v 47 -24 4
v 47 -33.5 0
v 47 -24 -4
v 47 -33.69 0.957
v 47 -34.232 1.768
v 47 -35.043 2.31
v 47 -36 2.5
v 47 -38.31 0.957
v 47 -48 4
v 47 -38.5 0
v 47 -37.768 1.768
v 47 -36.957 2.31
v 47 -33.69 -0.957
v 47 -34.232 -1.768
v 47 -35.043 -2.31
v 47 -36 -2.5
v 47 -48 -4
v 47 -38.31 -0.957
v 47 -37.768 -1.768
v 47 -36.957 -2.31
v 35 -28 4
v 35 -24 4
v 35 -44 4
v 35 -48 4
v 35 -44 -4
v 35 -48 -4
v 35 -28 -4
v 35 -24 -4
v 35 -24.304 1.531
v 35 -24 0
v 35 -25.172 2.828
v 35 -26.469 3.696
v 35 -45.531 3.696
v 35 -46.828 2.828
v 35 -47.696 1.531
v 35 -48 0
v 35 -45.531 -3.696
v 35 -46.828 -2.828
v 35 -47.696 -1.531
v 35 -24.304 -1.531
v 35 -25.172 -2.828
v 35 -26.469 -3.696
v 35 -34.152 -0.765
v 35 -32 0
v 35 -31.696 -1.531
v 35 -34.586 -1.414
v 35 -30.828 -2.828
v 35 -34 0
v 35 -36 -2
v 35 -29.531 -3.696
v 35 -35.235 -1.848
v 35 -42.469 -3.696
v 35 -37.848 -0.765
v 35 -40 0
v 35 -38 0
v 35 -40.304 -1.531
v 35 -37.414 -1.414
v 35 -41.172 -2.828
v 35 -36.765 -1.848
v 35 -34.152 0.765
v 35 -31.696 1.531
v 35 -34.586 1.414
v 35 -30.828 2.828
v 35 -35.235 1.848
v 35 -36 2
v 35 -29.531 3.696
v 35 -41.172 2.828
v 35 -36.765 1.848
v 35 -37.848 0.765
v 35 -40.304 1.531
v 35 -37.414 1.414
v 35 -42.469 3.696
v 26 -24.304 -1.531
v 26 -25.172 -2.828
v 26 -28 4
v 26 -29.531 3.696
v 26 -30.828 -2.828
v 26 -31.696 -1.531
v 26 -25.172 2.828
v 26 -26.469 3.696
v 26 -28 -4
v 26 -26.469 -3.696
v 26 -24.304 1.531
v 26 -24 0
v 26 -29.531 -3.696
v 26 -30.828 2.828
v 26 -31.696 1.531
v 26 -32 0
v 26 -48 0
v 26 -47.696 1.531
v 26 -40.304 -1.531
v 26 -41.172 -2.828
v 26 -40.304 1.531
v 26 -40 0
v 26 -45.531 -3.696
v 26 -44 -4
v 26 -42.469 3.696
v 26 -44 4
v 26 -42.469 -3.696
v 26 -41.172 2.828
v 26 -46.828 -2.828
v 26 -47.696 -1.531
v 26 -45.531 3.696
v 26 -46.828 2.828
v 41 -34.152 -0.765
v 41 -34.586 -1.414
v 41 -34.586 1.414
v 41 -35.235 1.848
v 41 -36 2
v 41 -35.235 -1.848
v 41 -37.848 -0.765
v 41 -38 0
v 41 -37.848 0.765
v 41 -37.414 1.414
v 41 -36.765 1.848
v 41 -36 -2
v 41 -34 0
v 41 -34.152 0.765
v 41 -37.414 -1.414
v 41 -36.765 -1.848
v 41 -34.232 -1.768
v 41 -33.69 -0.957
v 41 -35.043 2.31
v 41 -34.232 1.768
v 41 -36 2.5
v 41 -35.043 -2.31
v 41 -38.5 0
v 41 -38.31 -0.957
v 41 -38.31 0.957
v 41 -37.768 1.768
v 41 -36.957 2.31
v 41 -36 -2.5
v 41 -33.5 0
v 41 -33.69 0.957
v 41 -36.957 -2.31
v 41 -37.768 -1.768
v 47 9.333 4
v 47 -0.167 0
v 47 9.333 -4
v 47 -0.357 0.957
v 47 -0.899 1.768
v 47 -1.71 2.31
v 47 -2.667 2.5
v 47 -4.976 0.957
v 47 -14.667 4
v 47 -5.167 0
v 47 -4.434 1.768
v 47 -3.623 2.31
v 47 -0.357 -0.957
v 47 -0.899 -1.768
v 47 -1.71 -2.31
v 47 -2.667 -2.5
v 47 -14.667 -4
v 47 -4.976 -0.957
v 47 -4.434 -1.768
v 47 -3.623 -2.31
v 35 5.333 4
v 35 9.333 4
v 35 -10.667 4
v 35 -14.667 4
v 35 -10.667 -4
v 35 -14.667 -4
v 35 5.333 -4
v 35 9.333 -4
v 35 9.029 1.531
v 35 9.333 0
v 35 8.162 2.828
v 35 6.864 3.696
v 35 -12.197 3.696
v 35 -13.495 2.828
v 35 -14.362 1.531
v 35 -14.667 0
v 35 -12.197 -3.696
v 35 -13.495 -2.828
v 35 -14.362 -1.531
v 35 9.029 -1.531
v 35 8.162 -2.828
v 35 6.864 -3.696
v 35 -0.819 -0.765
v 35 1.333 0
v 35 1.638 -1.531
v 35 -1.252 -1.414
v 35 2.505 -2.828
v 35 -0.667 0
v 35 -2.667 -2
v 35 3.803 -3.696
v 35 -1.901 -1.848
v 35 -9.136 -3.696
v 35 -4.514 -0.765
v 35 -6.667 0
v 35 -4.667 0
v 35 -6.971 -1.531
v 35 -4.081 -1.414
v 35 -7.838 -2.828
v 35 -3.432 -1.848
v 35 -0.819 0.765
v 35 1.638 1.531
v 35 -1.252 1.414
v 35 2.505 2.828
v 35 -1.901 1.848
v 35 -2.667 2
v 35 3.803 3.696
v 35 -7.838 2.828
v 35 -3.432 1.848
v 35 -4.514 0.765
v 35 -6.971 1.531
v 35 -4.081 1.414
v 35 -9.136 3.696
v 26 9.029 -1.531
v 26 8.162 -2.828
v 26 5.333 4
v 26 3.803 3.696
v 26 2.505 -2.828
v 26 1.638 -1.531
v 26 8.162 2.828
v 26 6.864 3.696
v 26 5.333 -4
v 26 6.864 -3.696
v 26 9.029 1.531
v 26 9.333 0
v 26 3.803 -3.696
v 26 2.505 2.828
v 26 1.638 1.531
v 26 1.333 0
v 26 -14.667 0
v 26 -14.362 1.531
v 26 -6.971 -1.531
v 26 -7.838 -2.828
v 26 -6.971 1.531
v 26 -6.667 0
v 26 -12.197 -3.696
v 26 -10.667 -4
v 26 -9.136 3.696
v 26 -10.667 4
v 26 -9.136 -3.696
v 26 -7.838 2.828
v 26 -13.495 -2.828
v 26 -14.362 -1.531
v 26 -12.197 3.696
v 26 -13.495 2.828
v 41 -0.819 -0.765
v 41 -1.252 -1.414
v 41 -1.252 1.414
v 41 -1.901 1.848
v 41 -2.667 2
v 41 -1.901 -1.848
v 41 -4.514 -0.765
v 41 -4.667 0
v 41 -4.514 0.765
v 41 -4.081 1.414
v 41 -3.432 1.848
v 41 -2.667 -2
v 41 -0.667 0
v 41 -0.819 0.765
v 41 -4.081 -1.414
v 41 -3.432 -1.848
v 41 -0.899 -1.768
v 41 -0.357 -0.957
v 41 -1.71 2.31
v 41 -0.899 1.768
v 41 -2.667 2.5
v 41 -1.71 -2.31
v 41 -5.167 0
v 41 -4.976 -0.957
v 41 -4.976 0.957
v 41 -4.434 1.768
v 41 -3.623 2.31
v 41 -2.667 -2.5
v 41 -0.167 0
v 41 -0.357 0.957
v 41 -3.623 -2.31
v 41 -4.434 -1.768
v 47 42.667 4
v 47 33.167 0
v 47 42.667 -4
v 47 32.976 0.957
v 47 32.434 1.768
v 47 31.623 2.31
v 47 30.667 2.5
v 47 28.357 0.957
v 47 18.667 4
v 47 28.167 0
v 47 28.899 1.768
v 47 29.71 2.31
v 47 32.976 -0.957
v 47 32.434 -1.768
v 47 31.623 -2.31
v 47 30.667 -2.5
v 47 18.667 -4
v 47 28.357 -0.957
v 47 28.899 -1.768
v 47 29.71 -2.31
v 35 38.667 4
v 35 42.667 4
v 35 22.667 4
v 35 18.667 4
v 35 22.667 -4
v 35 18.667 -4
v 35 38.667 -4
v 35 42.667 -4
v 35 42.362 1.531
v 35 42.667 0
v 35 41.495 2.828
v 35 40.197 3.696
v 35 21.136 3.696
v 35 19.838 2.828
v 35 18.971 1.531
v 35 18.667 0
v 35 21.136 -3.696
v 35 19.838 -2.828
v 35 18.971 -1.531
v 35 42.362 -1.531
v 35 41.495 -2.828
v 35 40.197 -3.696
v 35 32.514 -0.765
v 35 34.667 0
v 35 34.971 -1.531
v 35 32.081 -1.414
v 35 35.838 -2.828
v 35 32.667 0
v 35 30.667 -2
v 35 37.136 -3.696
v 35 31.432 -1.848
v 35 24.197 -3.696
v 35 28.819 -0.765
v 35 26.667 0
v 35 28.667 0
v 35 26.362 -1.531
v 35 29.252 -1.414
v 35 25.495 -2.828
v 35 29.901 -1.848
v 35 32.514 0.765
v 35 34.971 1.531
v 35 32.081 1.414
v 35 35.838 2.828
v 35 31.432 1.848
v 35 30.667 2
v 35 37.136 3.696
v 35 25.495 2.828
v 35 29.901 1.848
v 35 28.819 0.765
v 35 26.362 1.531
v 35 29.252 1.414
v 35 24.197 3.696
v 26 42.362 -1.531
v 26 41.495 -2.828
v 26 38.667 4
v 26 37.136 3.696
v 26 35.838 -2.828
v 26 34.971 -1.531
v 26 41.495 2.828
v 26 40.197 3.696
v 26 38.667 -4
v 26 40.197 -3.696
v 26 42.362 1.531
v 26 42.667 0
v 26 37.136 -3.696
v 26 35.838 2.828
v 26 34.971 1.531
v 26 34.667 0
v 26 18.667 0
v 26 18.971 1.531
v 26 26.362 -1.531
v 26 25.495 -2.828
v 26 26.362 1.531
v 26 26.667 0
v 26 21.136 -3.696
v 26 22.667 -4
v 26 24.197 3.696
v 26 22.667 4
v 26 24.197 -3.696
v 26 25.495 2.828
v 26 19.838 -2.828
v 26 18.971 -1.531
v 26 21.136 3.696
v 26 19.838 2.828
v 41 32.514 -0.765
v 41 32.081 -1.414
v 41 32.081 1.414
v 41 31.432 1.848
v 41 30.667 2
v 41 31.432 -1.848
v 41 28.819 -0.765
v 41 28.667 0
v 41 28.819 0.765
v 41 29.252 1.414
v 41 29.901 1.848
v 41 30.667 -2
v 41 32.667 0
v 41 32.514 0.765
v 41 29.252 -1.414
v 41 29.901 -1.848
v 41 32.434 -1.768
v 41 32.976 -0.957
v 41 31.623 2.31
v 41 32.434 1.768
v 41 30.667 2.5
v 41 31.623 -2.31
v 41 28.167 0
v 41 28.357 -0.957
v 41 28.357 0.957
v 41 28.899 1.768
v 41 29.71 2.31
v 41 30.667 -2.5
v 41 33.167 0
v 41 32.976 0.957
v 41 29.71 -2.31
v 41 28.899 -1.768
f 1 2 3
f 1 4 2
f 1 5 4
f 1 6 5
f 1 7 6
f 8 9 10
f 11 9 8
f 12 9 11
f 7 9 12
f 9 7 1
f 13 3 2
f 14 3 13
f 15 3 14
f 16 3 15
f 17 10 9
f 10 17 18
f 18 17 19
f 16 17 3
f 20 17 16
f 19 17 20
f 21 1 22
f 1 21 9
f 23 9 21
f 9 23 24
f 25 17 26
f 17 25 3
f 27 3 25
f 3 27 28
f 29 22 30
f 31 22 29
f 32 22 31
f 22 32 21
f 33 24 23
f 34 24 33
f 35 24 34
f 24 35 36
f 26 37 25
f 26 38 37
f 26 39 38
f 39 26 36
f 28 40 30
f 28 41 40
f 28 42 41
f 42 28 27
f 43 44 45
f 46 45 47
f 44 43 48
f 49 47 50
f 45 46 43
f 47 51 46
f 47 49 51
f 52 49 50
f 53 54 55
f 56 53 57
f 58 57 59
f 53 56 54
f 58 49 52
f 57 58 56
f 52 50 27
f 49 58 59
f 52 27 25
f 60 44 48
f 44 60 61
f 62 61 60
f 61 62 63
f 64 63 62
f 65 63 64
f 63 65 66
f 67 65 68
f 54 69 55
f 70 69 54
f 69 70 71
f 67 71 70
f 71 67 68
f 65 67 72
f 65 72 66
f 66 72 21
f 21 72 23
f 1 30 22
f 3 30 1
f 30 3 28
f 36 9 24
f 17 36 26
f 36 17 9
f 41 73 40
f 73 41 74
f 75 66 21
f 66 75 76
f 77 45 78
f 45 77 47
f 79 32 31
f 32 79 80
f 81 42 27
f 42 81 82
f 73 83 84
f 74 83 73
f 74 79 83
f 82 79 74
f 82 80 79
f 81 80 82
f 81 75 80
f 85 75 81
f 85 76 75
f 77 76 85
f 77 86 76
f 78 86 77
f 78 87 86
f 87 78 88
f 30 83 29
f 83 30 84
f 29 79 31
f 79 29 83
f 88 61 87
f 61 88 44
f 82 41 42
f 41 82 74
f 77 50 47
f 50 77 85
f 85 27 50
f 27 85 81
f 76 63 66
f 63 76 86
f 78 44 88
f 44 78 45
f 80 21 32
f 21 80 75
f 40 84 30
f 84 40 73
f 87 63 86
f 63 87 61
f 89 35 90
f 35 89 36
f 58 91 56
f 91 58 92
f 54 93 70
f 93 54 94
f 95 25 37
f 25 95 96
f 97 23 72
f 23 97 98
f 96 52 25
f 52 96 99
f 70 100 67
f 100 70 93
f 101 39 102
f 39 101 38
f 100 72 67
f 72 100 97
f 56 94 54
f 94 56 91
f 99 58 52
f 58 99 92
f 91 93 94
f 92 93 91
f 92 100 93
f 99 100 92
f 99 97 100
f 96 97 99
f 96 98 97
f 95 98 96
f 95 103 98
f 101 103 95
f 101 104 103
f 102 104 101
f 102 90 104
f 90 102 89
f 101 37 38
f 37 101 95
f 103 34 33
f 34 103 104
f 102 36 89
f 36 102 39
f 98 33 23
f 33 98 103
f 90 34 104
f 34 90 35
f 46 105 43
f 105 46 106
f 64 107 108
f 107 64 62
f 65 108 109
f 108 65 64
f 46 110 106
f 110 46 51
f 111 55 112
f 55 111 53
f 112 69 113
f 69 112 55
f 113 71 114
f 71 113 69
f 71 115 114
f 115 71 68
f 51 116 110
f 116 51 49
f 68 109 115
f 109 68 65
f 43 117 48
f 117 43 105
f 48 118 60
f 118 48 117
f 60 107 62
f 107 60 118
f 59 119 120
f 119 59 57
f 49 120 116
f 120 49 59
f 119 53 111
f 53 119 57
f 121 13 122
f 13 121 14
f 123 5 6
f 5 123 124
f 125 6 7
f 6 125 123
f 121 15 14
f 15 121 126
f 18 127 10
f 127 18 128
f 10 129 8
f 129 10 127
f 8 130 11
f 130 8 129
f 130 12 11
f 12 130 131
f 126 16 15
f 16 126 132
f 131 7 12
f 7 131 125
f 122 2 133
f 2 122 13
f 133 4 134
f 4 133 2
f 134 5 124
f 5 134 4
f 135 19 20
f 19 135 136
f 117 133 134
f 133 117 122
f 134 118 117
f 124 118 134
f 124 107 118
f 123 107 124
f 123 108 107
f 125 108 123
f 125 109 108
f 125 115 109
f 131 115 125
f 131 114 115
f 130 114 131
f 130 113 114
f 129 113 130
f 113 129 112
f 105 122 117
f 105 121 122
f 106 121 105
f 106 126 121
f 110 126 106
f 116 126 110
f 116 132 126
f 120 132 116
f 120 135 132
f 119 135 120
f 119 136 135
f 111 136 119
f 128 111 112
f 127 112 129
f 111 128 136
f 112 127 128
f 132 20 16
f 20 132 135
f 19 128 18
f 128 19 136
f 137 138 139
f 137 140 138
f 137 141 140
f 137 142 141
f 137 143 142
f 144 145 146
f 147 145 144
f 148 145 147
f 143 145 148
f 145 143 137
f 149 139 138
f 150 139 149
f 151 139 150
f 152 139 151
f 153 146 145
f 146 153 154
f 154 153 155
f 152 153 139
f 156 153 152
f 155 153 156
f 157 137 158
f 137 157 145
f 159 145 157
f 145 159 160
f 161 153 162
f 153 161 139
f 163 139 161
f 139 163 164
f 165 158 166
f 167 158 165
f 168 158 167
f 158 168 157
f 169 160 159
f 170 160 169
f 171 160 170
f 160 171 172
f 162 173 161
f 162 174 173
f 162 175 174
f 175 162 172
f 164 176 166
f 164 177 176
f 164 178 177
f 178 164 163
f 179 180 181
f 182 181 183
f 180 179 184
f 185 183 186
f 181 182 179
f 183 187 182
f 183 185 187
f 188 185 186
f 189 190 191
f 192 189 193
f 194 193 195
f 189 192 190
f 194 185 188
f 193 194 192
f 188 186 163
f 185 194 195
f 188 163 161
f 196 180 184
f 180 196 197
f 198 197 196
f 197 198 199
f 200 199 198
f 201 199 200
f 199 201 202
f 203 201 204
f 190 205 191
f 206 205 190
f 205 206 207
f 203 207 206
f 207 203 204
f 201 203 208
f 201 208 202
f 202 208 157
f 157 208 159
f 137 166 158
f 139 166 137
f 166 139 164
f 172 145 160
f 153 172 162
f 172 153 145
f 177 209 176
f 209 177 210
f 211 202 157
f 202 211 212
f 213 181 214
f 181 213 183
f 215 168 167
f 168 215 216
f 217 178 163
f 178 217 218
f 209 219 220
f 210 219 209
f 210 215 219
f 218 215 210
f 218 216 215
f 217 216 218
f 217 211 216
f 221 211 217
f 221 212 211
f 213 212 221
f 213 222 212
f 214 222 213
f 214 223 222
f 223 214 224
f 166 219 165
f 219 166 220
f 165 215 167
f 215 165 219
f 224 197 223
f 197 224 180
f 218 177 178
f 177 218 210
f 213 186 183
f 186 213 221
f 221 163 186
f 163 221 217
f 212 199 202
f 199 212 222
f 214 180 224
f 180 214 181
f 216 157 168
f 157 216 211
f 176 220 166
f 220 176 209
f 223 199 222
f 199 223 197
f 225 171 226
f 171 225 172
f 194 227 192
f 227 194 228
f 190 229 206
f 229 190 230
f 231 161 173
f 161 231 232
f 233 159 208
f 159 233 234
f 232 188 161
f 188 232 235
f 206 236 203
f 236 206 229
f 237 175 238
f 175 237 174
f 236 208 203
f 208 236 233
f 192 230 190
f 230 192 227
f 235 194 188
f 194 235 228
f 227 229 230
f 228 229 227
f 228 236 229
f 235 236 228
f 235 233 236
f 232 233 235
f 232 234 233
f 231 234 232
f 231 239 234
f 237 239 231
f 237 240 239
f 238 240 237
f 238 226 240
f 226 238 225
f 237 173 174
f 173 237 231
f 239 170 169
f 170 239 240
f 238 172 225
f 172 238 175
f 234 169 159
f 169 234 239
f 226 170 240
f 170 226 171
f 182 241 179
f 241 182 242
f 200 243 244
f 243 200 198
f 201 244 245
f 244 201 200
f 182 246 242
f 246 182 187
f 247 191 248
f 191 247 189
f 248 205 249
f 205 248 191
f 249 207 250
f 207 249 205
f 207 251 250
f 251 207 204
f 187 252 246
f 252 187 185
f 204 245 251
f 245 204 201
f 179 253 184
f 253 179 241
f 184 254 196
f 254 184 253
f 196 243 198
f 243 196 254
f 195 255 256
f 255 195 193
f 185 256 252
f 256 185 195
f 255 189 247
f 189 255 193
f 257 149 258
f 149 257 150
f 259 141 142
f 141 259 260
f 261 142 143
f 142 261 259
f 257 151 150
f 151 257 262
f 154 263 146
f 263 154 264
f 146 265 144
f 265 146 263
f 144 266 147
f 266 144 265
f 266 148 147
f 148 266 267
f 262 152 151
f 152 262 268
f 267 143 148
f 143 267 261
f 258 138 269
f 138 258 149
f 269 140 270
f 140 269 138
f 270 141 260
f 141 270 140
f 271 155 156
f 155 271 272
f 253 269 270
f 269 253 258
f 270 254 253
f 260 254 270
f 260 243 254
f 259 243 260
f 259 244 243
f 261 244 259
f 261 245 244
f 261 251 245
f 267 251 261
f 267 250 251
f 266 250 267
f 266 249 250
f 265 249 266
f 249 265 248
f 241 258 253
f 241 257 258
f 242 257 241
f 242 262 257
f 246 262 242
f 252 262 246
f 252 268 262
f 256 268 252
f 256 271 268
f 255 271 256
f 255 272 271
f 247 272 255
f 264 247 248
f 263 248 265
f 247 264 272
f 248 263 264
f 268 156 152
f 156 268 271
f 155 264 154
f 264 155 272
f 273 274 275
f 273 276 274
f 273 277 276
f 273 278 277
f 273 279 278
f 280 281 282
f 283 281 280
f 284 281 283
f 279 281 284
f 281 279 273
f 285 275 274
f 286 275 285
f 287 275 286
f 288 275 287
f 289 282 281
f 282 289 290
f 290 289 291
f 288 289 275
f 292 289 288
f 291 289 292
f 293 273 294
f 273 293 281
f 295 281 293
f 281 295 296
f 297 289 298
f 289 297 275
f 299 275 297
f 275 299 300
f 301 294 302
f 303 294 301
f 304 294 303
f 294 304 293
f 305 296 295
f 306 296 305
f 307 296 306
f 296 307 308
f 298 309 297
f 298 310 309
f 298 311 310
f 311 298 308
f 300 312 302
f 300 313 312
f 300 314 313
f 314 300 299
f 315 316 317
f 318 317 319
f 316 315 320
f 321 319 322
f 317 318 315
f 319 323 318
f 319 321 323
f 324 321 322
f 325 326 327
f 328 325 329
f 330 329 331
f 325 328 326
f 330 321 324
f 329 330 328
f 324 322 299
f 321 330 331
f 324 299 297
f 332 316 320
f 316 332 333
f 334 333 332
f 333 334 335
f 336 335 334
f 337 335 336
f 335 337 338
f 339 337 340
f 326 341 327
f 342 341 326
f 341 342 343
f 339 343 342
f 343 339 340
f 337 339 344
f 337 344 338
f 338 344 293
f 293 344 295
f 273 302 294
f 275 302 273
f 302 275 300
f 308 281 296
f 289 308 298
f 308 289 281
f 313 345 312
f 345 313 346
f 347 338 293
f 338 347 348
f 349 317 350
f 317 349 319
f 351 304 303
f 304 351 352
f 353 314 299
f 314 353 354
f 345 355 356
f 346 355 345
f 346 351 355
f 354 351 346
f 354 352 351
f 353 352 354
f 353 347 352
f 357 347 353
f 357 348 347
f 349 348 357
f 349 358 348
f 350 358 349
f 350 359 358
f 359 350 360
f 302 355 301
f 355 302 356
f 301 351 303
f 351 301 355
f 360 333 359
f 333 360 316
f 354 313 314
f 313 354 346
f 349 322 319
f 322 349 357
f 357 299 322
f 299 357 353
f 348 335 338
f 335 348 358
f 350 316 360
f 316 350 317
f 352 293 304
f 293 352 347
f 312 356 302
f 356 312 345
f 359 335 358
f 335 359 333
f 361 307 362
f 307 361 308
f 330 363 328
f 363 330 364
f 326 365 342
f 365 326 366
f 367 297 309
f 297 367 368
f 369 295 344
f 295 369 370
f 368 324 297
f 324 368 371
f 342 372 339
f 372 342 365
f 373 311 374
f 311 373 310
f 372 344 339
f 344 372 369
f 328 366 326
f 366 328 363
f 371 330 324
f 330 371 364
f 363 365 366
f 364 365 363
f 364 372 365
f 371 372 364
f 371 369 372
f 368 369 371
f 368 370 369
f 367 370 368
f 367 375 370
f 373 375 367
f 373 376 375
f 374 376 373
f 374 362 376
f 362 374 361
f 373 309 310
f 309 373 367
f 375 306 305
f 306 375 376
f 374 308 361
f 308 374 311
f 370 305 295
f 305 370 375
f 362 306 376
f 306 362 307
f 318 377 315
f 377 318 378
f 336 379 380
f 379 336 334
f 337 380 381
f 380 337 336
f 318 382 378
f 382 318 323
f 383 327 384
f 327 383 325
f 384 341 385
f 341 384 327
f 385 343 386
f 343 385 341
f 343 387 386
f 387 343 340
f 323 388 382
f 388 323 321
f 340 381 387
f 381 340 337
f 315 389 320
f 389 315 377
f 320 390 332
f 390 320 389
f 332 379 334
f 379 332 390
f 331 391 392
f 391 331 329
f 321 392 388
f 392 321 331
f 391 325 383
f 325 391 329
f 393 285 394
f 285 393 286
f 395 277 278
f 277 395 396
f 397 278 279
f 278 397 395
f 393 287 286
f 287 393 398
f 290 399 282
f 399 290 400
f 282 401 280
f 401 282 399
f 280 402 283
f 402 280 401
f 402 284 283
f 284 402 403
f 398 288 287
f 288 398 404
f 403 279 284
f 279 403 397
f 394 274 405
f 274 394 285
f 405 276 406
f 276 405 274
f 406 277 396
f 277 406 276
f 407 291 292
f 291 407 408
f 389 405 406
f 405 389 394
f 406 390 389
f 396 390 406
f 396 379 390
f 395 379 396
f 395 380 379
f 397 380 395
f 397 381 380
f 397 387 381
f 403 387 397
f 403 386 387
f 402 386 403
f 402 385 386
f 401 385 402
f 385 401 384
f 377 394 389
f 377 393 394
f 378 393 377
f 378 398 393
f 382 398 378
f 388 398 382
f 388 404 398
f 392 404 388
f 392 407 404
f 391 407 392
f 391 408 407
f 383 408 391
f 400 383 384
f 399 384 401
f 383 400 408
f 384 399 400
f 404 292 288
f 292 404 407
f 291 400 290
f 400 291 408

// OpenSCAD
// file: beltdrive/beltdrive_suspension_top.scad
module beltdrive_suspension_top() {
    beltdrive_suspension_connector();
}
// file: beltdrive/beltdrive_suspension_connector.scad
module beltdrive_suspension_connector() {
    difference() {
        union() {
            cube(size=[ beltdrive_suspension_connector_width,
                        beltdrive_suspension_connector_length,
                        beltdrive_suspension_connector_height],
                        center=true);
            translate([ -(beltdrive_suspension_connector_width+beltdrive_suspension_connector_pin_length)/2,
                        (beltdrive_suspension_connector_length-beltdrive_suspension_connector_height)/2,
                        0]) {
                rotate([0, 90, 0]) {
                    cylinder(d=beltdrive_suspension_connector_height, h=10, center=true);
                }
            }
            translate([ -(beltdrive_suspension_connector_width+beltdrive_suspension_connector_pin_length)/2,
                        -(beltdrive_suspension_connector_length-beltdrive_suspension_connector_height)/2,
                        0]) {
                rotate([0, 90, 0]) {
                    cylinder(d=beltdrive_suspension_connector_height, h=10, center=true);
                }
            }
        }
        translate([0, 0, 0]) {
            rotate([0, -90, 0]) {
                m4xX();
            }
        }
    }
}
// file: beltdrive/beltdrive_suspension.scad
include <beltdrive_suspension_connector.scad>
include <beltdrive_suspension_top.scad>

module beltdrive_suspension_assembly() {
    arrange_in_line_Y(  frame_main_length, 
                        beltdrive_suspension_connector_length,
                        beltdrive_suspension_elements)
    beltdrive_suspension_top();
}
// file: beltdrive/belt_powerwheel.scad
module belt_powerwheel() {
    diameter = (beltdrive_powerwheel_element_amount * (beltdrive_belt_element_length + (beltdrive_belt_element_connector_dia + beltdrive_belt_element_connector_thickness*2-0.5))) / pi;
    
    difference() {
        cylinder( d=diameter, h=beltdrive_belt_width, center=true);
        
        translate([0, 0, 0]) {
            make_ring_of (diameter/2, beltdrive_powerwheel_element_amount) {
                rotate([270, 90, 0]) {
                    belt_element();
                }
            }
        }
        difference(){
            cylinder(d=diameter*2, h=beltdrive_belt_width+0.01, center=true);
            cylinder(d=diameter, h=beltdrive_belt_width+0.01, center=true);
        }
        translate([0, 0, beltdrive_belt_width/2+beltdrive_powerwheel_space_to_motor]) {
            rotate([0, 180, 0]) {
                parts_motor_beltdrive_main();
            }
        }
        translate([part_motor_beltdrive_main_shaft_dia/2 + min_thickness + m3_hexnut_height,
                    0,
                    beltdrive_belt_width/2 - (part_motor_beltdrive_main_shaft_length/2-3)]) {
            rotate([0, -90, 0]) {
                screw_hexsocket(3,
                                part_motor_beltdrive_main_shaft_dia,
                                m3_screw_hexsocket_head_diameter,
                                diameter);
                translate([0, 0, min_thickness + m3_hexnut_height/2]) {
                    hull() {
                        hexnut_cutout(m3_hexnut_diameter,m3_hexnut_height);
                        translate([10, 0, 0]) {
                            hexnut_cutout(m3_hexnut_diameter,m3_hexnut_height);
                        }
                    }
                }
            }
        }
    }
}




/*
r = 18;
module belt_powerwheel() {
    difference(){
        cylinder(r=r-(beltdrive_belt_block_height/4), h=beltdrive_belt_width, center=true);
        make_ring_of (r+0.3, 8){
            rotate([-90, 90, 0]) {
                belt_element();
            }
        }
        translate([0, 0, beltdrive_belt_width/2+beltdrive_powerwheel_space_to_motor]) {
            rotate([0, 180, 0]) {
                parts_motor_beltdrive_main();
            }
        }
        translate([part_motor_beltdrive_main_shaft_dia/2 + min_thickness + m3_hexnut_height,
                    0,
                    beltdrive_belt_width/2 - (part_motor_beltdrive_main_shaft_length/2-3)]) {
            rotate([0, -90, 0]) {
                screw_hexsocket(3,
                                part_motor_beltdrive_main_shaft_dia,
                                m3_screw_hexsocket_head_diameter,
                                beltdrive_belt_block_height*2);
                translate([0, 0, min_thickness + m3_hexnut_height/2]) {
                    hull() {
                        hexnut_cutout(m3_hexnut_diameter,m3_hexnut_height);
                        translate([10, 0, 0]) {
                            hexnut_cutout(m3_hexnut_diameter,m3_hexnut_height);
                        }
                    }
                }
            }
        }
    }
}
*/
// file: beltdrive/belt_wheel.scad
// Beltdrive belt element
beltdrive_belt_width = 20;
beltdrive_belt_element_length = 8;
beltdrive_belt_block_height = 6;
beltdrive_belt_block_top_width_reduce = 4;
beltdrive_belt_element_connector_dia = 1.75;
beltdrive_belt_element_connector_thickness = 1;

// Beltdrive wheel
beltdrive_wheel_width = beltdrive_belt_width;
beltdrive_wheel_dia = 15;
beltdrive_wheel_bolt_dia = 8;
// Beltdrive suspension
beltdrive_suspension_elements = 3;
beltdrive_suspension_connector_length = 24;
beltdrive_suspension_connector_width = 12;
beltdrive_suspension_connector_height = 8;
beltdrive_suspension_leg_top_length = 30;
beltdrive_suspension_leg_top_width = beltdrive_suspension_connector_width;
beltdrive_suspension_leg_top_angle = 40;
beltdrive_suspension_leg_top_joint_dia = 10;
beltdrive_suspension_leg_top_joint_bolt_dia = beltdrive_suspension_leg_top_joint_dia/2;
beltdrive_suspension_leg_bottom_joint_extra_cutout_height = 2;
beltdrive_suspension_leg_bottom_joint_extra_cutout_angle = 8;
beltdrive_suspension_leg_bottom_joint_width = beltdrive_suspension_connector_width/2;
beltdrive_suspension_leg_bottom_joint_dia = beltdrive_suspension_leg_top_joint_dia-1;
beltdrive_suspension_leg_bottom_length = beltdrive_suspension_leg_top_length;
beltdrive_suspension_leg_bottom_width = beltdrive_suspension_leg_bottom_joint_width;
beltdrive_suspension_leg_bottom_height = beltdrive_suspension_leg_bottom_width;
beltdrive_suspension_leg_bottom_wheel_connector_dia_thickness = 4;
beltdrive_suspension_leg_bottom_wheel_connector_width = beltdrive_wheel_width/2;



module belt_wheel() {
    translate([10, 0, 0]) {
        rotate([0, 90, 0]) {
            cylinder(d=beltdrive_wheel_dia, h=10, center=true);
        }
    }
}
// file: frame/frame_connector.scad
module frame_connector_male() {
    difference() {
        union() {
            cube(size=[frame_connector_block_width, frame_connector_block_length, frame_connector_block_height], center=true);
            translate([frame_connector_block_width/2-frame_connector_pin_dia/2-min_thickness, -(frame_connector_block_length-min_thickness/2), 0]) {
                rotate([90, 0, 0]) {
                    cylinder(d=frame_connector_pin_dia-tollerance_push_fit, h=frame_connector_pin_length, center=true);    
                }    
            }
            translate([-(frame_connector_block_width/2-frame_connector_pin_dia/2-min_thickness), -(frame_connector_block_length-min_thickness/2), 0]) {
                rotate([90, 0, 0]) {
                    cylinder(d=frame_connector_pin_dia-tollerance_push_fit, h=frame_connector_pin_length, center=true);    
                }    
            }
        }
        translate([0, frame_connector_block_length/2-m4_screw_hexsocket_head_height+0.1, 0]) {
            rotate([90, 0, 0]) {
                m4xX();    
            }
        }
        frame_connector_screwholes();
    }
}
module frame_connector_female() {
    difference() {
        cube(size=[frame_connector_block_width, frame_connector_block_length, frame_connector_block_height], center=true);
        translate([frame_connector_block_width/2-frame_connector_pin_dia/2-min_thickness, min_thickness/2+0.1, 0]) {
            rotate([90, 0, 0]) {
                cylinder(d=frame_connector_pin_dia, h=frame_connector_pin_length, center=true);    
            }    
        }
        translate([-(frame_connector_block_width/2-frame_connector_pin_dia/2-min_thickness), min_thickness/2+0.1, 0]) {
            rotate([90, 0, 0]) {
                cylinder(d=frame_connector_pin_dia, h=frame_connector_pin_length, center=true);    
            }    
        }
        translate([0, frame_connector_block_length/2+1, 0]) {
            rotate([90, 0, 0]) {
                m4xX();    
            }
        }
        translate([0, -frame_connector_block_length/2+m4_hexnut_height/2-0.1, 0]) {
            rotate([90, 0, 0]) {
                hull() {
                    m4nut();    
                }
            }
        }
    }
}

module frame_connector_screwholes() {
    translate([0, 0, -(frame_connector_block_height + frame_front_thickness)/2]) {
        // Screwholes bottom
        translate([  frame_connector_block_width/2-frame_connector_pin_dia/2-min_thickness,
                    -frame_connector_block_length/2-frame_connector_pin_length/2-1,
                    -frame_bottom_screwhole_thickness]) {
            m4xX();
        }
        translate([  -(frame_connector_block_width/2-frame_connector_pin_dia/2-min_thickness),
                    -frame_connector_block_length/2-frame_connector_pin_length/2-1,
                    -frame_bottom_screwhole_thickness]) {
            m4xX();
        }


        // Hexnutholes bottom
        translate([  frame_connector_block_width/2-frame_connector_pin_dia/2-min_thickness,
                    -frame_connector_block_length/2-frame_connector_pin_length/2-1,
                    frame_main_thickness/2+frame_connector_block_height-m4_hexnut_height/2+0.01]) {
            m4nutCutout();
        }
        translate([  -(frame_connector_block_width/2-frame_connector_pin_dia/2-min_thickness),
                    -frame_connector_block_length/2-frame_connector_pin_length/2-1,
                    frame_main_thickness/2+frame_connector_block_height-m4_hexnut_height/2+0.01]) {
            m4nutCutout();
        }

   }
   
}
// file: frame/frame_bottom.scad
module frame_bottom() {
    difference() {
        hull() {
            // Top
            cube(size=[frame_main_width, frame_main_length+2, 1], center=true);
            translate([0, frame_main_length/2+frame_front_length+0.5, 0]) {
                cube(size=[frame_front_narrow_width, 1, 1], center=true);
            }
            translate([0, -frame_main_length/2-frame_back_length-0.5, 0]) {
                cube(size=[frame_back_narrow_width, 1, 1], center=true);
            }
            // Bottom
            translate([0, 0, -frame_bottom_thickness]) {
                scale([ frame_bottom_lower_plate_scaling,
                        frame_bottom_lower_plate_scaling,
                        1]) {
                    cube(size=[frame_main_width, frame_main_length+2, 1], center=true);
                    translate([0, frame_main_length/2+frame_front_length+0.5, 0]) {
                        cube(size=[frame_front_narrow_width, 1, 1], center=true);
                    }
                    translate([0, -frame_main_length/2-frame_back_length-0.5, 0]) {
                        cube(size=[frame_back_narrow_width, 1, 1], center=true);
                    }
                }
            }
        }

        // Screwholes
        translate([  frame_connector_block_width/2-frame_connector_pin_dia/2-min_thickness,
                    frame_main_length/2-frame_connector_block_length/2,
                    -frame_bottom_screwhole_thickness]) {
            m4xX();
        }
        translate([  -(frame_connector_block_width/2-frame_connector_pin_dia/2-min_thickness),
                    frame_main_length/2-frame_connector_block_length/2,
                    -frame_bottom_screwhole_thickness]) {
            m4xX();
        }
        translate([  frame_connector_block_width/2-frame_connector_pin_dia/2-min_thickness,
                    -(frame_main_length/2-frame_connector_block_length/2),
                    -frame_bottom_screwhole_thickness]) {
            m4xX();
        }
        translate([  -(frame_connector_block_width/2-frame_connector_pin_dia/2-min_thickness),
                    -(frame_main_length/2-frame_connector_block_length/2),
                    -frame_bottom_screwhole_thickness]) {
            m4xX();
        }
    }
}
// file: frame/frame_back.scad
module frame_back() {
    hull() {
        cube(size=[frame_back_width, 1, frame_back_thickness], center=true);
        translate([0, -frame_back_length, 0]) {
            cube(size=[frame_back_narrow_width, 1, frame_back_thickness], center=true);
        }
    }
    translate([0, -frame_connector_block_length/2+0.5, (frame_back_thickness+frame_connector_block_height)/2]) {
        rotate([0, 0, 180]) {
            frame_connector_male();
        }
    }
    
    // Slope
    translate([0, 0, frame_back_thickness/2]) {
        difference() {
            hull() {
                cube(size=[frame_back_width, 1, 1], center=true);
                translate([0, -frame_back_length, 0]) {
                    cube(size=[frame_back_narrow_width, 1, 1], center=true);
                }
                translate([0, 0, frame_wall_height-0.5]) {
                    cube(size=[frame_back_width, 1, 1], center=true);
                }
            }
            translate([0, 0, frame_connector_block_height/2]) {
                rotate([90, 0, 0]) {
                    cylinder(d=m3_screw_hexsocket_head_diameter, h=100, center=true);       
                }
            }
        }
        // Pins
        translate([ -frame_back_width/2+frame_wall_thickness/2,
                    frame_connector_pin_length/2,
                    frame_wall_height-(frame_wall_thickness-min_thickness*2)/2-min_thickness]) {
            rotate([90, 0, 0]) {
                cylinder(d=frame_wall_thickness-min_thickness*2+tollerance_push_fit, h=frame_connector_pin_length, center=true);
            }
            
        }
        translate([ frame_back_width/2-frame_wall_thickness/2,
                    frame_connector_pin_length/2,
                    frame_wall_height-(frame_wall_thickness-min_thickness*2)/2-min_thickness]) {
            rotate([90, 0, 0]) {
                cylinder(d=frame_wall_thickness-min_thickness*2+tollerance_push_fit, h=frame_connector_pin_length, center=true);
            }
        }
    }
}
// file: frame/frame_front.scad
module frame_front() {
    hull() {
        cube(size=[frame_front_width, 1, frame_front_thickness], center=true);
        translate([0, frame_front_length, 0]) {
            cube(size=[frame_front_narrow_width, 1, frame_front_thickness], center=true);
        }
    }
    translate([0, frame_connector_block_length/2-0.5, (frame_connector_block_height + frame_front_thickness)/2]) {
        frame_connector_male();
    }

    // Slope
    translate([0, 0, frame_front_thickness/2]) {
        difference() {
            hull() {
                cube(size=[frame_front_width, 1, 1], center=true);
                translate([0, frame_front_length, 0]) {
                    cube(size=[frame_front_narrow_width, 1, 1], center=true);
                }
                translate([0, 0, frame_wall_height-0.5]) {
                    cube(size=[frame_front_width, 1, 1], center=true);
                }
            }
            translate([0, 0, frame_connector_block_height/2]) {
                rotate([90, 0, 0]) {
                    cylinder(d=m3_screw_hexsocket_head_diameter, h=100, center=true);       
                }
            }
        }
        // Pins
        translate([ -frame_front_width/2+frame_wall_thickness/2,
                    -frame_connector_pin_length/2,
                    frame_wall_height-(frame_wall_thickness-min_thickness*2)/2-min_thickness]) {
            rotate([90, 0, 0]) {
                cylinder(d=frame_wall_thickness-min_thickness*2+tollerance_push_fit, h=frame_connector_pin_length, center=true);
            }
            
        }
        translate([ frame_front_width/2-frame_wall_thickness/2,
                    -frame_connector_pin_length/2,
                    frame_wall_height-(frame_wall_thickness-min_thickness*2)/2-min_thickness]) {
            rotate([90, 0, 0]) {
                cylinder(d=frame_wall_thickness-min_thickness*2+tollerance_push_fit, h=frame_connector_pin_length, center=true);
            }
        }
    }
}
// file: frame/frame_main.scad
module frame_main() {
    difference() {
        frame_main_main();
        frame_main_screwholes();   
    }
}

module frame_main_main() {
        // base
    cube(size=[frame_main_width, frame_main_length, frame_main_thickness], center=true);
    translate([0, frame_main_length/2-frame_connector_block_length/2, (frame_main_thickness+frame_connector_block_height)/2]) {
        frame_connector_female();
    }
    translate([0, -(frame_main_length/2-frame_connector_block_length/2), (frame_main_thickness+frame_connector_block_height)/2]) {
        rotate([0, 0, 180]) {
            frame_connector_female();
        }   
    }

    // walls
    difference() {
        translate([0, 0, (frame_main_thickness+frame_wall_height)/2]) {
            difference() {
                cube(size=[frame_main_width, frame_main_length, frame_wall_height], center=true);
                cube(size=[frame_main_width-frame_wall_thickness*2, frame_main_length+0.1, frame_wall_height+0.1], center=true);
            }
        }
        translate([ -frame_main_width/2+frame_wall_thickness/2,
                    -(frame_main_length-frame_connector_pin_length)/2-0.01,
                    frame_wall_height+frame_main_thickness/2-(frame_wall_thickness-min_thickness*2)/2-min_thickness]) {
            rotate([90, 0, 0]) {
                cylinder(d=frame_wall_thickness-min_thickness*2+tollerance_push_fit, h=frame_connector_pin_length, center=true);
            }
            
        }
        translate([ frame_main_width/2-frame_wall_thickness/2,
                    -(frame_main_length-frame_connector_pin_length)/2-0.01,
                    frame_wall_height+frame_main_thickness/2-(frame_wall_thickness-min_thickness*2)/2-min_thickness]) {
            rotate([90, 0, 0]) {
                cylinder(d=frame_wall_thickness-min_thickness*2+tollerance_push_fit, h=frame_connector_pin_length, center=true);
            }
        }
        translate([ -frame_main_width/2+frame_wall_thickness/2,
                    (frame_main_length-frame_connector_pin_length)/2+0.01,
                    frame_wall_height+frame_main_thickness/2-(frame_wall_thickness-min_thickness*2)/2-min_thickness]) {
            rotate([90, 0, 0]) {
                cylinder(d=frame_wall_thickness-min_thickness*2+tollerance_push_fit, h=frame_connector_pin_length, center=true);
            }
            
        }
        translate([ frame_main_width/2-frame_wall_thickness/2,
                    (frame_main_length-frame_connector_pin_length)/2+0.01,
                    frame_wall_height+frame_main_thickness/2-(frame_wall_thickness-min_thickness*2)/2-min_thickness]) {
            rotate([90, 0, 0]) {
                cylinder(d=frame_wall_thickness-min_thickness*2+tollerance_push_fit, h=frame_connector_pin_length, center=true);
            }
        }
    }    
}

module frame_main_screwholes() {
    // Screwholes bottom
    translate([  frame_connector_block_width/2-frame_connector_pin_dia/2-min_thickness,
                frame_main_length/2-frame_connector_block_length/2,
                -frame_bottom_screwhole_thickness]) {
        m4xX();
    }
    translate([  -(frame_connector_block_width/2-frame_connector_pin_dia/2-min_thickness),
                frame_main_length/2-frame_connector_block_length/2,
                -frame_bottom_screwhole_thickness]) {
        m4xX();
    }
    translate([  frame_connector_block_width/2-frame_connector_pin_dia/2-min_thickness,
                -(frame_main_length/2-frame_connector_block_length/2),
                -frame_bottom_screwhole_thickness]) {
        m4xX();
    }
    translate([  -(frame_connector_block_width/2-frame_connector_pin_dia/2-min_thickness),
                -(frame_main_length/2-frame_connector_block_length/2),
                -frame_bottom_screwhole_thickness]) {
        m4xX();
    }

    //Hexnutholes bottom
    translate([  frame_connector_block_width/2-frame_connector_pin_dia/2-min_thickness,
                frame_main_length/2-frame_connector_block_length/2,
                frame_main_thickness/2+frame_connector_block_height-m4_hexnut_height/2+0.01]) {
        m4nutCutout();
    }
    translate([  -(frame_connector_block_width/2-frame_connector_pin_dia/2-min_thickness),
                frame_main_length/2-frame_connector_block_length/2,
                frame_main_thickness/2+frame_connector_block_height-m4_hexnut_height/2+0.01]) {
        m4nutCutout();
    }
    translate([  frame_connector_block_width/2-frame_connector_pin_dia/2-min_thickness,
                -(frame_main_length/2-frame_connector_block_length/2),
                frame_main_thickness/2+frame_connector_block_height-m4_hexnut_height/2+0.01]) {
        m4nutCutout();
    }
    translate([  -(frame_connector_block_width/2-frame_connector_pin_dia/2-min_thickness),
                -(frame_main_length/2-frame_connector_block_length/2),
                frame_main_thickness/2+frame_connector_block_height-m4_hexnut_height/2+0.01]) {
        m4nutCutout();
    }
}
// file: beltdrive/beltdrive.scad
include <belt_element.scad>
include <belt_wheel.scad>
include <belt_powerwheel.scad>
include <beltdrive_suspension.scad>

module beltdrive_assembly() {
    translate([(frame_main_width+beltdrive_suspension_connector_width)/2, 0, 0]) {
        beltdrive_suspension_assembly();    
    }
    
}
// file: frame/frame.scad
include <frame_main.scad>
include <frame_front.scad>
include <frame_back.scad>
include <frame_bottom.scad>
include <frame_connector.scad>

module frame_assembly() {
    frame_main();
    translate([0, (frame_main_length+1)/2, 0]) {   
        frame_front();
    }
    translate([0, -(frame_main_length+1)/2, 0]) {
        frame_back();    
    }
    translate([0, 0, -frame_main_thickness/2]) {
     frame_bottom();   
    }
}
// file: parts/screws.scad
/*
    screws.scad
*/


module screw_hexsocket(diameter, length, head_diameter, head_height) {
    translate([0, 0, length/2-0.01]) {
        cylinder(d=diameter, h=length, center=true);
    }
    translate([0, 0, -head_height/2]) {
        cylinder(d=head_diameter, h=head_height, center=true);
    }
}

module hexnut(diameter,height,hole) {
    difference() {
        hull() {
            cube(size=[diameter, diameter/1.7322, height], center=true);
            rotate([0, 0, 120]){
                cube(size=[diameter, diameter/1.7322, height], center=true);
            } 
            rotate([0, 0, -120]) {
                cube(size=[diameter, diameter/1.7322, height], center=true);
            }
        }
        cylinder(d=hole, h=height+2, center=true);
    }
}

module hexnut_cutout(diameter,height) {
    hull() {
        cube(size=[diameter, diameter/1.7322, height], center=true);
        rotate([0, 0, 120]){
            cube(size=[diameter, diameter/1.7322, height], center=true);
        } 
        rotate([0, 0, -120]) {
            cube(size=[diameter, diameter/1.7322, height], center=true);
        }
    }
}



module m3nut() {
    hexnut(m3_hexnut_diameter, m3_hexnut_height, 3);
}
module m3xX() {
    screw_hexsocket(3, 200, m3_screw_hexsocket_head_diameter, 200);
}
module m3x10() {
    screw_hexsocket(3, 10, m3_screw_hexsocket_head_diameter, m3_screw_hexsocket_head_height);
}
module m3x12() {
    screw_hexsocket(3, 12, m3_screw_hexsocket_head_diameter, m3_screw_hexsocket_head_height);
}
module m3x15() {
    screw_hexsocket(3, 15, m3_screw_hexsocket_head_diameter, m3_screw_hexsocket_head_height);
}
module m3x20() {
    screw_hexsocket(3, 20, m3_screw_hexsocket_head_diameter, m3_screw_hexsocket_head_height);
}
module m3x25() {
    screw_hexsocket(3, 25, m3_screw_hexsocket_head_diameter, m3_screw_hexsocket_head_height);
}

module m4nutCutout() {
    hexnut_cutout(m4_hexnut_diameter, m4_hexnut_height);
}
module m4nut() {
    hexnut(m4_hexnut_diameter, m4_hexnut_height, 4);
}
module m4xX() {
    screw_hexsocket(4, 200, m4_screw_hexsocket_head_diameter, 200);
}
module m4x10() {
    screw_hexsocket(4, 10, m4_screw_hexsocket_head_diameter, m4_screw_hexsocket_head_height);
}
module m4x12() {
    screw_hexsocket(4, 12, m4_screw_hexsocket_head_diameter, m4_screw_hexsocket_head_height);
}
module m4x15() {
    screw_hexsocket(4, 15, m4_screw_hexsocket_head_diameter, m4_screw_hexsocket_head_height);
}
module m4x20() {
    screw_hexsocket(4, 20, m4_screw_hexsocket_head_diameter, m4_screw_hexsocket_head_height);
}
module m4x25() {
    screw_hexsocket(4, 25, m4_screw_hexsocket_head_diameter, m4_screw_hexsocket_head_height);
}
// file: functions.scad
/*
    functions.scad
    --------------

    all main functions gatherd in this file
*/

// Make ring of Objects
module make_ring_of (radius, count) {
    for (a = [0: count -1]){
        angle = a * 360 /count;
        
        translate (radius * [sin(angle), -cos(angle), 0])
            rotate ([0, 0, angle])
                children ();
    }
}

// Arrange Object ins a Line
// along Y-Axis
module arrange_in_line_Y (length, object_length, count) {
    
    length = length-object_length;

    for (i = [0: count -1]){
        translate([0, -length/2+(object_length/count/4)+(length/count*i)+(object_length/count*(i)), 0]) {
            children ();
        }
    }
}
// file: math.scad
// Frame
frame_connector_block_width = frame_main_width - frame_connector_block_space_to_sides*2;
frame_connector_pin_length = frame_connector_block_length-min_thickness;
frame_connector_pin_dia = frame_connector_block_height - min_thickness*2;
frame_front_narrow_width = frame_front_width-frame_front_width_narrow;
frame_back_narrow_width = frame_back_width-frame_back_width_narrow;

// Beltdrive
beltdrive_suspension_connector_pin_length = frame_wall_thickness-min_thickness;
// file: properties_parts.scad
/*
    properties_parts.scad
    --------------------

*/

// Screws
m3_screw_hexsocket_head_diameter = 5;
m3_screw_hexsocket_head_height = 3;
m3_hexnut_diameter = 6; //Size of wrench
m3_hexnut_height = 4;

m4_screw_hexsocket_head_diameter = 5;
m4_screw_hexsocket_head_height = 3;
m4_hexnut_diameter = 8; //Size of wrench
m4_hexnut_height = 4;
// file: properties.scad
/*
    proberties.scad
    ---------------

    All Variables are declaered here for easy editing of the model
*/

// Fixed values
$fn = 16;

min_thickness = 2;
tollerance_push_fit = 0.1;


// Frame
frame_wall_height = 15;
frame_wall_thickness = 10;
// Frame Connector Block
frame_connector_block_length = 12;
frame_connector_block_space_to_sides = frame_wall_thickness;
frame_connector_block_height = frame_connector_block_length;
// Frame Main
frame_main_length = 100;
frame_main_width = 70;
frame_main_height = 0;
frame_main_thickness = 8;
// Frame Front
frame_front_length = 30;
frame_front_width = frame_main_width;
frame_front_width_narrow = 20;
frame_front_height = frame_main_height;
frame_front_thickness = frame_main_thickness;
// Frame back
frame_back_length = 30;
frame_back_width = frame_main_width;
frame_back_width_narrow = 20;
frame_back_height = frame_main_height;
frame_back_thickness = frame_main_thickness;
// Frame bottom
frame_bottom_thickness = 8;
frame_bottom_lower_plate_scaling = 0.4; // 0.01-1.0
frame_bottom_screwhole_thickness = 2;

//Beltdrive
beltdrive_suspension_elements = 3;
beltdrive_suspension_connector_length = 28;
beltdrive_suspension_connector_width = 12;
beltdrive_suspension_connector_height = 8;
// file: main.scad
// Main Variables
include <properties.scad>
include <properties_parts.scad>
include <math.scad>
include <functions.scad>

// Parts
include <parts/screws.scad>

// Frame
include <frame/frame.scad>

// Beltdrive
include <beltdrive/beltdrive.scad>
// main file
include <main.scad>

%frame_assembly();
beltdrive_assembly();
